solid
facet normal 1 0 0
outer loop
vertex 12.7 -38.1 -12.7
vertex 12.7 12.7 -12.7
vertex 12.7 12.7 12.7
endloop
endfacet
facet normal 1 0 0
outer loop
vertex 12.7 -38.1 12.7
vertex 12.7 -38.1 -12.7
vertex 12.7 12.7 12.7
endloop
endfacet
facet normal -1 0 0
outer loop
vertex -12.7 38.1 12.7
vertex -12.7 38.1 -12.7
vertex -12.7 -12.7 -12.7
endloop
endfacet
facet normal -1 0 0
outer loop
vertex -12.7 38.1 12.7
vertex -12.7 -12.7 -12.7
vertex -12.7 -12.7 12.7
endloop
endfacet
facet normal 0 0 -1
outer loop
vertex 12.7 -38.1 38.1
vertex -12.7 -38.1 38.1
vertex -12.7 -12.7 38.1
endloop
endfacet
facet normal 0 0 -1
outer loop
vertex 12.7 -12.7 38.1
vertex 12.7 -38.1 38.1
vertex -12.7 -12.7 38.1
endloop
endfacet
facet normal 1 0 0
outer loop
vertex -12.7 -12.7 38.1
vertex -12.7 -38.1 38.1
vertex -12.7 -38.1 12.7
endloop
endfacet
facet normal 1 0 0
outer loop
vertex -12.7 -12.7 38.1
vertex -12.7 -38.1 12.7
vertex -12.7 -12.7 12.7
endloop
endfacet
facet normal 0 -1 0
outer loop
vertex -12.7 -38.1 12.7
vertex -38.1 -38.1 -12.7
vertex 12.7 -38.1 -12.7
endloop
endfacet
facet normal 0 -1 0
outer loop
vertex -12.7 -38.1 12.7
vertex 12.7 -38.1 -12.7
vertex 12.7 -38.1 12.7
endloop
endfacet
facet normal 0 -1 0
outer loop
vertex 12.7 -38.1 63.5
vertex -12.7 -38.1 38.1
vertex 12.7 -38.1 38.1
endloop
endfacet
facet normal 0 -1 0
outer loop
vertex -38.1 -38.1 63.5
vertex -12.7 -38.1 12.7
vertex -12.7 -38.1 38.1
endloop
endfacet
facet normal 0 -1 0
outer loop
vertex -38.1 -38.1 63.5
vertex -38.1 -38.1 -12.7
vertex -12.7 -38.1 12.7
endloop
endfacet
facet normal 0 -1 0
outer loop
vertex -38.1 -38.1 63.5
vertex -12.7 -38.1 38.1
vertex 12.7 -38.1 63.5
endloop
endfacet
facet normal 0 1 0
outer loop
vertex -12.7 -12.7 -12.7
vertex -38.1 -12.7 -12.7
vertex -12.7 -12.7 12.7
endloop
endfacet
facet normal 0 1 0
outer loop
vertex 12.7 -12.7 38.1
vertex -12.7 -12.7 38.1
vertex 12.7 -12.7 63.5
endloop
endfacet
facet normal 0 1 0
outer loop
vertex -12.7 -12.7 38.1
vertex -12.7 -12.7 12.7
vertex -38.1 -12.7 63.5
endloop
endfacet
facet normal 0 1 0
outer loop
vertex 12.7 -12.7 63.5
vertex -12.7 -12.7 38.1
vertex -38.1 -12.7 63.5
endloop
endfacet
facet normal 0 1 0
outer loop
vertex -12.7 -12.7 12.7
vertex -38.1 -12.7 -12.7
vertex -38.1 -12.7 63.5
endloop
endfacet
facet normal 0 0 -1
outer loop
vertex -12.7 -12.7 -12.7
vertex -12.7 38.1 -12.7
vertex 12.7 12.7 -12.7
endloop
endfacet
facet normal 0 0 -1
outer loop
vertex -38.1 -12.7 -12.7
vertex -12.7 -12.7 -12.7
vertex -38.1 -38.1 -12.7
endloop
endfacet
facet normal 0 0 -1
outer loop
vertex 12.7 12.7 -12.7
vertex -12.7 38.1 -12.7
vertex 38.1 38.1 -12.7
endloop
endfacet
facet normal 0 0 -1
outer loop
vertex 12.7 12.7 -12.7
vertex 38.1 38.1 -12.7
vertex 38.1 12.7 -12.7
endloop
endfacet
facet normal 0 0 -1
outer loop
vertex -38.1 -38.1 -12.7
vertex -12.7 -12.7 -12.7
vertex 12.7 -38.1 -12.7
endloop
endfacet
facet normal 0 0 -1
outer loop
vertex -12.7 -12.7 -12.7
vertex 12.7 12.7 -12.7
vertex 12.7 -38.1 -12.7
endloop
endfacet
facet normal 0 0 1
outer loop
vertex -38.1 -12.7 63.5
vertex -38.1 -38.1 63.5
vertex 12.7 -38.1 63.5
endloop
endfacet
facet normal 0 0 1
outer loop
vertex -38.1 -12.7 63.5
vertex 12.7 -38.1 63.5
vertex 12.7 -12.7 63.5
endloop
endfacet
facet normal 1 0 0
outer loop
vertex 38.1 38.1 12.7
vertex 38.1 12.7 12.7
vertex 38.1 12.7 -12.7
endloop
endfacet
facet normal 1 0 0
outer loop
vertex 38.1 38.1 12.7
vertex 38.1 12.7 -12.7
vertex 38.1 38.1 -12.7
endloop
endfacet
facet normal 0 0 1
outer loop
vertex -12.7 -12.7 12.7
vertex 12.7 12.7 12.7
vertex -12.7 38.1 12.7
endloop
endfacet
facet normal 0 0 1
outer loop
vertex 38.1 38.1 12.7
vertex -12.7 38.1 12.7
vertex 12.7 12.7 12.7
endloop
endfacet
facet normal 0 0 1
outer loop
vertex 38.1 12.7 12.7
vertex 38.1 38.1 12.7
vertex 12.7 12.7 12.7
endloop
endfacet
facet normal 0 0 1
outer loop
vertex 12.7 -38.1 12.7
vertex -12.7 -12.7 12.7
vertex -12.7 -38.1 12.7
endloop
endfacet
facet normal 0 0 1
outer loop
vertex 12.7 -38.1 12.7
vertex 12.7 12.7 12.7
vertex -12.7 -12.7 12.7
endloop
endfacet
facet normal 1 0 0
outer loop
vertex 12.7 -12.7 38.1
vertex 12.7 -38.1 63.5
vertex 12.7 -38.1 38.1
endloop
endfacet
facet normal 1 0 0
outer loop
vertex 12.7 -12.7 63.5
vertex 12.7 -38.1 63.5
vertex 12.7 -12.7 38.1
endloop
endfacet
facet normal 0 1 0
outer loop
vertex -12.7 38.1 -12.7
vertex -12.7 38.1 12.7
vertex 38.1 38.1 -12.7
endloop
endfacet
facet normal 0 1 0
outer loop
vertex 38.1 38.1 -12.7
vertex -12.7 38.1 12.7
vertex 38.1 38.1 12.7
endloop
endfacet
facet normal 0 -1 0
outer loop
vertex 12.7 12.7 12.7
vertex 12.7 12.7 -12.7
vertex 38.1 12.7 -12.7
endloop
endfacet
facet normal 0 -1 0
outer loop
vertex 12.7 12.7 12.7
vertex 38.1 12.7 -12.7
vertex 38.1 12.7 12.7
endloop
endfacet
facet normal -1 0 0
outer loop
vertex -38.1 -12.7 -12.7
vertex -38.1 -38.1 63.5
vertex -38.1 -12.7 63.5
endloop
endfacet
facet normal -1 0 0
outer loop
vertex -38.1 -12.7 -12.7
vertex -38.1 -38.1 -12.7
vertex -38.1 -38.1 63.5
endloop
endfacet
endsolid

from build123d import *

# Parameters (mm, degrees)
F0_W     = 25.4
F0_H     = 25.4
F1_DEPTH = 38.1
F2_W     = 25.4
F2_H     = 25.4
F3_DEPTH = 38.1
F4_W     = 25.4
F4_H     = 25.4
F5_DEPTH = 25.4
F6_W     = 25.4
F6_H     = 25.4
F7_DEPTH = 50.8
F8_W     = 25.4
F8_H     = 25.4
F9_DEPTH = 25.4


with BuildPart() as f1:
    # F0 (on Front) → F1 (new body, symmetric)
    with BuildSketch(Plane.XZ):
        Rectangle(F0_W, F0_H)
    extrude(amount=F1_DEPTH, both=True)

    # F2 (on Right) → F3 (join)
    with BuildSketch(Plane.YZ):
        with Locations((25.4, 0)):
            Rectangle(F2_W, F2_H)
    extrude(amount=F3_DEPTH)

    # F4 (on face) → F5 (join)
    with BuildSketch(Plane(origin=(-12.7, 0, 0), x_dir=(0, -1, 0), z_dir=(-1, 0, 0))):
        with Locations((25.4, 0)):
            Rectangle(F4_W, F4_H)
    extrude(amount=F5_DEPTH)

    # F6 (on face) → F7 (join)
    with BuildSketch(Plane.XY.offset(12.7)):
        with Locations((-25.4, -25.4)):
            Rectangle(F6_W, F6_H)
    extrude(amount=F7_DEPTH)

    # F8 (on face) → F9 (join)
    with BuildSketch(Plane.YZ.offset(-12.7)):
        with Locations((-25.4, 50.8)):
            Rectangle(F8_W, F8_H)
    extrude(amount=F9_DEPTH)


solid = f1.part
